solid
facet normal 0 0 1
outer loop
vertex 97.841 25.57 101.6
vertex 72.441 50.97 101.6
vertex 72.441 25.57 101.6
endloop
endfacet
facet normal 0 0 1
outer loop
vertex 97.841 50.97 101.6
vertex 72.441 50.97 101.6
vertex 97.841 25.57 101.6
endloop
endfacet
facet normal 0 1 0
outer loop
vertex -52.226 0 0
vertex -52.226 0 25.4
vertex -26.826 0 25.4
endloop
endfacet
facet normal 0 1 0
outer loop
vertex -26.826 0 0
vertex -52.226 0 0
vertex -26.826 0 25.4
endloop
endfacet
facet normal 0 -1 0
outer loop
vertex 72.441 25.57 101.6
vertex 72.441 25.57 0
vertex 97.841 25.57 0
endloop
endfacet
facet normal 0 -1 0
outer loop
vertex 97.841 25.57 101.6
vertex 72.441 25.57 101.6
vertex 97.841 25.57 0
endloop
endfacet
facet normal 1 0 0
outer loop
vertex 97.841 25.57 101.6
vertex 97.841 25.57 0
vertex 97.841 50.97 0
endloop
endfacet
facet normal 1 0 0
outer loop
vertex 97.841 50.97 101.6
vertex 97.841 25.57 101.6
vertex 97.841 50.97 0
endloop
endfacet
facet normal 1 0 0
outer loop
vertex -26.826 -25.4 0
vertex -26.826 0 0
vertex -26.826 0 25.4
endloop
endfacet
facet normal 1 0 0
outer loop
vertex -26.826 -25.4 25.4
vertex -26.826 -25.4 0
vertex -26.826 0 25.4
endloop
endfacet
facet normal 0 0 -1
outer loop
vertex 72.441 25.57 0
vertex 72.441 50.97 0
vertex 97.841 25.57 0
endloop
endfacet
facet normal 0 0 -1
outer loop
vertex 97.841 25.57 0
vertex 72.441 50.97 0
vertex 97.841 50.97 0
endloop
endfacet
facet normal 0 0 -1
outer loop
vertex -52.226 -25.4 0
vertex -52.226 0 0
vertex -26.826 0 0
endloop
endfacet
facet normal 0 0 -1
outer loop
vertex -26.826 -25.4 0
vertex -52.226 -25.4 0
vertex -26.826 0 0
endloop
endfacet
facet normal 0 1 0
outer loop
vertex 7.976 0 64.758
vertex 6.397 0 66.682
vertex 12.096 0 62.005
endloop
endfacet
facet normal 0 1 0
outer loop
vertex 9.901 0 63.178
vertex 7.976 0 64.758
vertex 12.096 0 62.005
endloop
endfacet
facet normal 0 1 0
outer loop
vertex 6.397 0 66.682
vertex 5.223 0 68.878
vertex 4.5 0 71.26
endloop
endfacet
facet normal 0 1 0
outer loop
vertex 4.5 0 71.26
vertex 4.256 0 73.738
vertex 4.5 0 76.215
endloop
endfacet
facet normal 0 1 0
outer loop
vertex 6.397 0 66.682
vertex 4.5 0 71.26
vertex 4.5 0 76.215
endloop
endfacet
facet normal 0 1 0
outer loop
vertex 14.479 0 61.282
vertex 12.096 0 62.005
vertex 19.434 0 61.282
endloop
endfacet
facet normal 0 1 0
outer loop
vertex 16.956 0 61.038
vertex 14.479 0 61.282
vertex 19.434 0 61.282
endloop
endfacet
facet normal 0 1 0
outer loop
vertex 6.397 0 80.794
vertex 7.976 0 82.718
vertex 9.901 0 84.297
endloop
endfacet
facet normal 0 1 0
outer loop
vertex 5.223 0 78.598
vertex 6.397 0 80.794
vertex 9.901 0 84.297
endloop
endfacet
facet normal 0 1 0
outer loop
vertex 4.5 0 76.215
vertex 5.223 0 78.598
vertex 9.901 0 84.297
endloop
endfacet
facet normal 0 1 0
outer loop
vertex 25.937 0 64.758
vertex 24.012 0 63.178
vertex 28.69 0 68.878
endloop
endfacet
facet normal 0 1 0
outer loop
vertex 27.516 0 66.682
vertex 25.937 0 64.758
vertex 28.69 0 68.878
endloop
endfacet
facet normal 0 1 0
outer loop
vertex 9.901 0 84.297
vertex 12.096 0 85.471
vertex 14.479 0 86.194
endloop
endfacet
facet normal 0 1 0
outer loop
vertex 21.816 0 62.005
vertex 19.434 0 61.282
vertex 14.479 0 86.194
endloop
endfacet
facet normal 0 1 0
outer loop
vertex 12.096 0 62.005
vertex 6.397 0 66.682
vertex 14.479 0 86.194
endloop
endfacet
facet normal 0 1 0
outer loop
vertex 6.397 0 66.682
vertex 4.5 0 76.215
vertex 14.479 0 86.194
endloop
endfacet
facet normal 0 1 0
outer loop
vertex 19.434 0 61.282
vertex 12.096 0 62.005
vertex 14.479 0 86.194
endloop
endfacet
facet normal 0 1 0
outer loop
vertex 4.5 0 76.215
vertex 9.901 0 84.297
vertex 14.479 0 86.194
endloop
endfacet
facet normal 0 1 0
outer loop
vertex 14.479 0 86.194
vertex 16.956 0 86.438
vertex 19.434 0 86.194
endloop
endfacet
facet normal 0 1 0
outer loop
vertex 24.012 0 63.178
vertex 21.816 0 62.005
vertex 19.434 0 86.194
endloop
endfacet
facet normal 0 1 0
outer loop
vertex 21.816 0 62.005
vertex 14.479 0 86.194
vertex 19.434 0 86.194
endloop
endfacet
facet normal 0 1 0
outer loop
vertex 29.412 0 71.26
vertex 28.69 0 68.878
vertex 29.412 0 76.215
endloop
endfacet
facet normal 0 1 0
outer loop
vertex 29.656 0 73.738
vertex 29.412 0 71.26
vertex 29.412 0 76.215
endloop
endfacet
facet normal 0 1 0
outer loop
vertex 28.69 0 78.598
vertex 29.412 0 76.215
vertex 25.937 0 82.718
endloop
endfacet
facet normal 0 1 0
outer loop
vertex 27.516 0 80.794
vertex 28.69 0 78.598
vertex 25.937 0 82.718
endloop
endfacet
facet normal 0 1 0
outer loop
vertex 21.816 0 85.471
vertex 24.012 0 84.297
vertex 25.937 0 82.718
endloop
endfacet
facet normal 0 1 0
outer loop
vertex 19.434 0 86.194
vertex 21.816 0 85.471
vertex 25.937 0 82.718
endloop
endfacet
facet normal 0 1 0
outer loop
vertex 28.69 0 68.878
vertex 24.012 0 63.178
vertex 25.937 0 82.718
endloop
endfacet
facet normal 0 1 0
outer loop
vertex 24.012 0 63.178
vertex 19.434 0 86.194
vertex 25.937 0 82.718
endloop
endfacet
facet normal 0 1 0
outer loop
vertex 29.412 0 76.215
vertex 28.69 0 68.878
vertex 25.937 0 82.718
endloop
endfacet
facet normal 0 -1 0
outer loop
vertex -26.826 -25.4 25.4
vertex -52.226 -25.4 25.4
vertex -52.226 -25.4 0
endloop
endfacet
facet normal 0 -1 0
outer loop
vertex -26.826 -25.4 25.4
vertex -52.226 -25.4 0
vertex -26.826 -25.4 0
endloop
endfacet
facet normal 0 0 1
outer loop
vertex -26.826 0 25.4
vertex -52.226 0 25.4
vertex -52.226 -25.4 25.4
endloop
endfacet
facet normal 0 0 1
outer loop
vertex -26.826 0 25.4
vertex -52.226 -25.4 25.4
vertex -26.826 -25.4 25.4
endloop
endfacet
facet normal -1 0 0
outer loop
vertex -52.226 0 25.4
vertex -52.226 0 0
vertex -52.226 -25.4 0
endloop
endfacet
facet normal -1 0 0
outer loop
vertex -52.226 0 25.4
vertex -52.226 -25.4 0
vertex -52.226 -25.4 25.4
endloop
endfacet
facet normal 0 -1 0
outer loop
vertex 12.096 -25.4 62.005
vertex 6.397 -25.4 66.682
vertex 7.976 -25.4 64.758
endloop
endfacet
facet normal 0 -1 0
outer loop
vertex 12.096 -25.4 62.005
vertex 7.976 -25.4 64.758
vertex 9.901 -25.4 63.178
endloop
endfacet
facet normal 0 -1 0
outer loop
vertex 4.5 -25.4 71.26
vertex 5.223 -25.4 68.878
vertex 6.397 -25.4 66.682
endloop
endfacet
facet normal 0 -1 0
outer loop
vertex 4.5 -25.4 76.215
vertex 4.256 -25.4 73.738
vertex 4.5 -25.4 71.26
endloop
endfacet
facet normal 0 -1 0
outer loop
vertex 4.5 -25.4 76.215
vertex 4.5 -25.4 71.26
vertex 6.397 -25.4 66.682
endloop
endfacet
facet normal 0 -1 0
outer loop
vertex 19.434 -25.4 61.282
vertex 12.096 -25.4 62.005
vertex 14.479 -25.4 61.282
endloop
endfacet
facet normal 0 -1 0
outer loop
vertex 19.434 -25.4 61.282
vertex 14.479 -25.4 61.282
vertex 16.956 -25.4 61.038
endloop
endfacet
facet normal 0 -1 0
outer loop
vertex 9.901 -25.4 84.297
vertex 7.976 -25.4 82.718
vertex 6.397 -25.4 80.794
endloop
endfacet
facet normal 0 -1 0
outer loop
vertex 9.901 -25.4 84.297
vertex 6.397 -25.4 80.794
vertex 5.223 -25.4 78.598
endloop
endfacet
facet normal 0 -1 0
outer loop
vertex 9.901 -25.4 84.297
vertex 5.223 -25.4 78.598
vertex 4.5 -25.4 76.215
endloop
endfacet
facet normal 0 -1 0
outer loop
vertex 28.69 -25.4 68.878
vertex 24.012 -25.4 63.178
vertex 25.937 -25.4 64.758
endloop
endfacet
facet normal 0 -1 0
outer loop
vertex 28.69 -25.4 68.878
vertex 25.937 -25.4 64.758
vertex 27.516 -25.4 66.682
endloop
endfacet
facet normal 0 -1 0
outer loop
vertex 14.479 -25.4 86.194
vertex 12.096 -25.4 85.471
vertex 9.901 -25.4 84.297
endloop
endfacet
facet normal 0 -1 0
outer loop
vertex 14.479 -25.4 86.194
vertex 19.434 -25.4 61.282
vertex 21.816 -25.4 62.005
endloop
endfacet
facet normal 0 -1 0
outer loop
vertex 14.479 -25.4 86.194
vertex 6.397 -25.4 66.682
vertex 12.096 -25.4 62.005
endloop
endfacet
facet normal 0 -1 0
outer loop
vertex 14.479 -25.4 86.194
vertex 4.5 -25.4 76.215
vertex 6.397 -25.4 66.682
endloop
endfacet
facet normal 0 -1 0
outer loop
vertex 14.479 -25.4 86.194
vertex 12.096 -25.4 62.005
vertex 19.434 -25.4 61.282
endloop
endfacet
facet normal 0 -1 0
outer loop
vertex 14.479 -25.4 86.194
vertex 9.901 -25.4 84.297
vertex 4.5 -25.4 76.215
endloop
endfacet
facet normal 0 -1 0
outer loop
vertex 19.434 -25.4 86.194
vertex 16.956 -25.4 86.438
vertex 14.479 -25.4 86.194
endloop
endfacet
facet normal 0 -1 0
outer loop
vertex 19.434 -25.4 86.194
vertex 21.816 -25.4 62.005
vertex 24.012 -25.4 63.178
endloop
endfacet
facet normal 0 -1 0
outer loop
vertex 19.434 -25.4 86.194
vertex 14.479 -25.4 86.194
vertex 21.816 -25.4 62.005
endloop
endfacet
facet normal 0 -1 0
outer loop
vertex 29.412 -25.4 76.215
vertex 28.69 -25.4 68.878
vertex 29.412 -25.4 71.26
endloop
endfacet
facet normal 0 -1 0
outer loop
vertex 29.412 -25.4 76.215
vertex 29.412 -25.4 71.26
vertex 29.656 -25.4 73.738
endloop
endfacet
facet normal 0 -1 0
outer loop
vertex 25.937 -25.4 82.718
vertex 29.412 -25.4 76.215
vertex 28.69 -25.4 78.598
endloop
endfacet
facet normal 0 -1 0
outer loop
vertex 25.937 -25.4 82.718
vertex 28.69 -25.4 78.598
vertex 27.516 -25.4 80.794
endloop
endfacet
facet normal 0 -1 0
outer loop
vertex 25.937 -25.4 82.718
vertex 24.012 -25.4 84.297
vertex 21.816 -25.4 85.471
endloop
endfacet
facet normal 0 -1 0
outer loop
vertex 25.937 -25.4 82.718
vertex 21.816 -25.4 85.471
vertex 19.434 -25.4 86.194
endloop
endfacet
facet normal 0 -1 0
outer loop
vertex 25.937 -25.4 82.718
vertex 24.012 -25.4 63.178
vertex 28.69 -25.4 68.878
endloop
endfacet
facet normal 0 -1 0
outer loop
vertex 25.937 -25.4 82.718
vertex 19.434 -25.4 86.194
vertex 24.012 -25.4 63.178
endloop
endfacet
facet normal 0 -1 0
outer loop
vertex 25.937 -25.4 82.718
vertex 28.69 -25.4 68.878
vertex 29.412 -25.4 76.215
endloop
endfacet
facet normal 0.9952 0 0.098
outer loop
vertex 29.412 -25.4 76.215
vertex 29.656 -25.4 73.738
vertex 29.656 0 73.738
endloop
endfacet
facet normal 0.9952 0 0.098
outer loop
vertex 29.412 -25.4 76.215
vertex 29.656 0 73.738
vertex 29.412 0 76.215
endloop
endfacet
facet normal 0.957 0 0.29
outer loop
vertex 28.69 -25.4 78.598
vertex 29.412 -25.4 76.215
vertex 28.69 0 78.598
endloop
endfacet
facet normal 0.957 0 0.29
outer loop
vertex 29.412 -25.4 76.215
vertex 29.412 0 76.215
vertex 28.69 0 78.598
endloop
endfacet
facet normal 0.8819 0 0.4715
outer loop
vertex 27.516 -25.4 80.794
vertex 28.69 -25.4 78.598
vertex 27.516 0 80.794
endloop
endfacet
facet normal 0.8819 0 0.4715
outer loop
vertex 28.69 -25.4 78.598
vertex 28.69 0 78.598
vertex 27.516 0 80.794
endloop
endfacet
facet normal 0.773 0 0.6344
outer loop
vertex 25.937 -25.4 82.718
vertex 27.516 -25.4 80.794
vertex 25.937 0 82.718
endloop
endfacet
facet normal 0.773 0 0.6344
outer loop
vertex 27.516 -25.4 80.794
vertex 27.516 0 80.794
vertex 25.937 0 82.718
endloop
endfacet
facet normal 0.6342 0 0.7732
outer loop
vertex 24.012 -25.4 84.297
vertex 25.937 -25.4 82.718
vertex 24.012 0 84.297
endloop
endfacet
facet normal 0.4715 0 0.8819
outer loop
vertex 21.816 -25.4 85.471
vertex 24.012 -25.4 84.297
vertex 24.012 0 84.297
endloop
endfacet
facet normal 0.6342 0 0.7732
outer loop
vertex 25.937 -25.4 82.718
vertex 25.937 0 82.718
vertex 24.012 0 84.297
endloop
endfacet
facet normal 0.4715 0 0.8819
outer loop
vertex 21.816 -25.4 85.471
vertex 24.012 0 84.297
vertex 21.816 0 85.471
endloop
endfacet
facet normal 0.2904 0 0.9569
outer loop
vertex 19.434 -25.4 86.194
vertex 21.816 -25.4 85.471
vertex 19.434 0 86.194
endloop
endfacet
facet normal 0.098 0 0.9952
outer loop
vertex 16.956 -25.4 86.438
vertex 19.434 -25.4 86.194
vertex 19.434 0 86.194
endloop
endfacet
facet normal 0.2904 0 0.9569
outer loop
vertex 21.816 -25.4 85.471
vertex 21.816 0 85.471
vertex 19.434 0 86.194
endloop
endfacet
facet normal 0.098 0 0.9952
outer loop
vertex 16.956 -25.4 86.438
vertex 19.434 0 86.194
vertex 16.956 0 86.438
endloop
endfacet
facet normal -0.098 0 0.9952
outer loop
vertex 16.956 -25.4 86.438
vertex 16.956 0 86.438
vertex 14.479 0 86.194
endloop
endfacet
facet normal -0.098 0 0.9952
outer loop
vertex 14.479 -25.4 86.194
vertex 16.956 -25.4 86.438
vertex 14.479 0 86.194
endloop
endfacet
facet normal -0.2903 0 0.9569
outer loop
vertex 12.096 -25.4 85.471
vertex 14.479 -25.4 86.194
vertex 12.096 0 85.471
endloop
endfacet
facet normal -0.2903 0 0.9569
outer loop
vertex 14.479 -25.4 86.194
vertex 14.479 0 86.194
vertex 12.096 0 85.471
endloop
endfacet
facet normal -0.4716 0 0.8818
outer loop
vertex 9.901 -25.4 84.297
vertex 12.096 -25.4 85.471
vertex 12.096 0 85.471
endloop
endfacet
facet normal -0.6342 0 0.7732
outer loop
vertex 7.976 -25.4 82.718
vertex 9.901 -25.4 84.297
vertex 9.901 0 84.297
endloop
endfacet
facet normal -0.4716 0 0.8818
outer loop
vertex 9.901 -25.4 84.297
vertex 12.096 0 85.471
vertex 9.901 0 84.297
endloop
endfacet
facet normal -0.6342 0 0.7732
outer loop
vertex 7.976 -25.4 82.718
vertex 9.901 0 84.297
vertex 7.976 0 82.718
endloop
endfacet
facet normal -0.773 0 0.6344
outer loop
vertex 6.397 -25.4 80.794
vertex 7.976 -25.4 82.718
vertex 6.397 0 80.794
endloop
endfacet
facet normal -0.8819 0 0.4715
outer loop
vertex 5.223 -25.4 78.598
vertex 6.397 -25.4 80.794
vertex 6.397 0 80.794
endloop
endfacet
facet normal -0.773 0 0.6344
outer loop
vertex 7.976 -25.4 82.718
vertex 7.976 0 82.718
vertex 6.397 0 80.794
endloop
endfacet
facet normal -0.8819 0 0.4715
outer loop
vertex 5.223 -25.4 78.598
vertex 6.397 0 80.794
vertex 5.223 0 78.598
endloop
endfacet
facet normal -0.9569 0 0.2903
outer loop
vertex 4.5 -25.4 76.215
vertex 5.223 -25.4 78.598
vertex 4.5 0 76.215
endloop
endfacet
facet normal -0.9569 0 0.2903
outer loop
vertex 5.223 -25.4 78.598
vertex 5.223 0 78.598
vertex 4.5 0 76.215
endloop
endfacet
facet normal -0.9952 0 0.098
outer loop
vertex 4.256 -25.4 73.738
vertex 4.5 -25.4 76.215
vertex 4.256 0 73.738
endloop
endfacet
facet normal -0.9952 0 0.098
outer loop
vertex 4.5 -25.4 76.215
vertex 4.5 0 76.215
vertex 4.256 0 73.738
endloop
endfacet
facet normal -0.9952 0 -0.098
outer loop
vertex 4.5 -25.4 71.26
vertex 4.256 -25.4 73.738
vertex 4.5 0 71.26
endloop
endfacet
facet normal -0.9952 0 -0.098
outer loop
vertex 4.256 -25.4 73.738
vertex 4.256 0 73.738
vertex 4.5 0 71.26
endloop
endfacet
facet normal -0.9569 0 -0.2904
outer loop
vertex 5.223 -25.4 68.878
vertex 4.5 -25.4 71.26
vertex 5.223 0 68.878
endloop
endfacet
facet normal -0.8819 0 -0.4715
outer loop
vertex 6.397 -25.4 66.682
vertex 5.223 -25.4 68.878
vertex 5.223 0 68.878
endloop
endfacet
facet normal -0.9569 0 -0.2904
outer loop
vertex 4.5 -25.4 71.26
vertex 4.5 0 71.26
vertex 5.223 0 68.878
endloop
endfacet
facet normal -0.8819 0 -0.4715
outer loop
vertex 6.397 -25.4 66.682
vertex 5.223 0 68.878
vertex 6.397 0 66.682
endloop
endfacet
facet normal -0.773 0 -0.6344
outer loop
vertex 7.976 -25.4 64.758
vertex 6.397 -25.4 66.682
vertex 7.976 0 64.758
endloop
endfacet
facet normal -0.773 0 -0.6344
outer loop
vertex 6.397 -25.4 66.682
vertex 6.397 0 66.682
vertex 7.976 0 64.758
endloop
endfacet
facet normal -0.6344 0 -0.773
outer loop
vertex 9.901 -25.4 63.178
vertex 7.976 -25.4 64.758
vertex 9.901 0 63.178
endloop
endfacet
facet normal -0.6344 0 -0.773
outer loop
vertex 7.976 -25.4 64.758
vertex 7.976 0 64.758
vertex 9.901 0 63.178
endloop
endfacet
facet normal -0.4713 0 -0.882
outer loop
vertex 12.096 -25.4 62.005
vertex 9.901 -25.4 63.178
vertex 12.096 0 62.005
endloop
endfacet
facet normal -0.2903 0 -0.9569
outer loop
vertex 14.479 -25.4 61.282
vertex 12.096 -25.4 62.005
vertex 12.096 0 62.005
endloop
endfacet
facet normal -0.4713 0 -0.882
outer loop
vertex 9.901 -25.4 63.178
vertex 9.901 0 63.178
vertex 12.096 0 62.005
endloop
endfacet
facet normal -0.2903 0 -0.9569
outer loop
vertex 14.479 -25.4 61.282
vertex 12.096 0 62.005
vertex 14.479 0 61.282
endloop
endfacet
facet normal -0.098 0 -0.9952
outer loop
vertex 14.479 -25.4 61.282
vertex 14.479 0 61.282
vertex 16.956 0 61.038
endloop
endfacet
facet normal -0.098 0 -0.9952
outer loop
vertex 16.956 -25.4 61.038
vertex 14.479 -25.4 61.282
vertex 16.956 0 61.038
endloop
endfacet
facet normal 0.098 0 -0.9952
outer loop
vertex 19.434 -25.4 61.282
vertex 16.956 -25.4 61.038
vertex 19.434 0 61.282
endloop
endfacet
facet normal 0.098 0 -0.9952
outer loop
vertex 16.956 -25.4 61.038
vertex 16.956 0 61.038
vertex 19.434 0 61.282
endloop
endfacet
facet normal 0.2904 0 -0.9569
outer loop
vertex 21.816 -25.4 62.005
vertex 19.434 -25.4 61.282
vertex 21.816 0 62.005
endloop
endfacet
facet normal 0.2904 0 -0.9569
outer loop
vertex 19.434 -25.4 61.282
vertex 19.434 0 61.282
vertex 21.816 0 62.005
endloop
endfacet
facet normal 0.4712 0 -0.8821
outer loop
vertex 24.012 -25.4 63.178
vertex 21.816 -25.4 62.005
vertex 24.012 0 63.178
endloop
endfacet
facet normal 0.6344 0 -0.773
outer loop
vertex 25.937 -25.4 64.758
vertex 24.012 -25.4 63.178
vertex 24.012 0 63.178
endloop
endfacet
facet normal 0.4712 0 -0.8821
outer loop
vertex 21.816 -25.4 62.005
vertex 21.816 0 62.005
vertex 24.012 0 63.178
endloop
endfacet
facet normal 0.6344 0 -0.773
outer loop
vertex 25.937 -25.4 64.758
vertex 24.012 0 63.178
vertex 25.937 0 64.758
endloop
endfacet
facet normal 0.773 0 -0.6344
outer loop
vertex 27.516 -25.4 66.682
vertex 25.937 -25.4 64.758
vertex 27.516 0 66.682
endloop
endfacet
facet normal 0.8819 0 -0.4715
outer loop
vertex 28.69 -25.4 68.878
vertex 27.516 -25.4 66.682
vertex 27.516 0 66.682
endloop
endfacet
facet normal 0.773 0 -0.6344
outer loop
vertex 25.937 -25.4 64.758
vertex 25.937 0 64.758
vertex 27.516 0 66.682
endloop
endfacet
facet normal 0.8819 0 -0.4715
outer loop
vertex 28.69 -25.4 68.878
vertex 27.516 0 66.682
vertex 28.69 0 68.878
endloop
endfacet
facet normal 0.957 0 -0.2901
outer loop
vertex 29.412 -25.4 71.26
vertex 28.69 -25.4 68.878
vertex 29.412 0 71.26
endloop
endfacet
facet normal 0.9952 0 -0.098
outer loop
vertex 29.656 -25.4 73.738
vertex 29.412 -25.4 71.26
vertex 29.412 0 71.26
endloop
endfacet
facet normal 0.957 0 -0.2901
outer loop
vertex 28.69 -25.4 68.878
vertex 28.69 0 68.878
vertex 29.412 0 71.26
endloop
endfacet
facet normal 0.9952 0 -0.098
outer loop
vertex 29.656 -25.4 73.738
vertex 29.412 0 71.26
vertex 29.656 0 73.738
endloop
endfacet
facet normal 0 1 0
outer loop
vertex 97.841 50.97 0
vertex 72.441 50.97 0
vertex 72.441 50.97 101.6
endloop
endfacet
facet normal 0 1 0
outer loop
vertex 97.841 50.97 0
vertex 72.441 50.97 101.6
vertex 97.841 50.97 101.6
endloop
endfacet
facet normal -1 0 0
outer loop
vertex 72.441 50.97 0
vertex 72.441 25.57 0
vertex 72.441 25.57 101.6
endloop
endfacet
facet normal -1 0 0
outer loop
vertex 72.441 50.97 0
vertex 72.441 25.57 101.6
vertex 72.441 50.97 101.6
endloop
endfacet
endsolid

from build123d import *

# Parameters (mm, degrees)
F0_W     = 25.4
F0_H     = 25.4
F1_DEPTH = 25.4
F2_W     = 25.4
F2_H     = 25.4
F3_DEPTH = 101.6
F4_R     = 12.7
F5_DEPTH = 25.4


with BuildPart() as f1:
    # F0 (on Front) → F1 (new body)
    with BuildSketch(Plane.XZ):
        with Locations((-39.525672, 12.7)):
            Rectangle(F0_W, F0_H)
    extrude(amount=F1_DEPTH)


with BuildPart() as f3:
    # F2 (on Top) → F3 (new body)
    with BuildSketch(Plane.XY):
        with Locations((85.140519, 38.270074)):
            Rectangle(F2_W, F2_H)
    extrude(amount=F3_DEPTH)


with BuildPart() as f5:
    # F4 (on Front) → F5 (new body)
    with BuildSketch(Plane.XZ):
        with Locations((16.956391, 73.737822)):
            Circle(F4_R)
    extrude(amount=F5_DEPTH)


solid = Compound([f1.part, f3.part, f5.part])
